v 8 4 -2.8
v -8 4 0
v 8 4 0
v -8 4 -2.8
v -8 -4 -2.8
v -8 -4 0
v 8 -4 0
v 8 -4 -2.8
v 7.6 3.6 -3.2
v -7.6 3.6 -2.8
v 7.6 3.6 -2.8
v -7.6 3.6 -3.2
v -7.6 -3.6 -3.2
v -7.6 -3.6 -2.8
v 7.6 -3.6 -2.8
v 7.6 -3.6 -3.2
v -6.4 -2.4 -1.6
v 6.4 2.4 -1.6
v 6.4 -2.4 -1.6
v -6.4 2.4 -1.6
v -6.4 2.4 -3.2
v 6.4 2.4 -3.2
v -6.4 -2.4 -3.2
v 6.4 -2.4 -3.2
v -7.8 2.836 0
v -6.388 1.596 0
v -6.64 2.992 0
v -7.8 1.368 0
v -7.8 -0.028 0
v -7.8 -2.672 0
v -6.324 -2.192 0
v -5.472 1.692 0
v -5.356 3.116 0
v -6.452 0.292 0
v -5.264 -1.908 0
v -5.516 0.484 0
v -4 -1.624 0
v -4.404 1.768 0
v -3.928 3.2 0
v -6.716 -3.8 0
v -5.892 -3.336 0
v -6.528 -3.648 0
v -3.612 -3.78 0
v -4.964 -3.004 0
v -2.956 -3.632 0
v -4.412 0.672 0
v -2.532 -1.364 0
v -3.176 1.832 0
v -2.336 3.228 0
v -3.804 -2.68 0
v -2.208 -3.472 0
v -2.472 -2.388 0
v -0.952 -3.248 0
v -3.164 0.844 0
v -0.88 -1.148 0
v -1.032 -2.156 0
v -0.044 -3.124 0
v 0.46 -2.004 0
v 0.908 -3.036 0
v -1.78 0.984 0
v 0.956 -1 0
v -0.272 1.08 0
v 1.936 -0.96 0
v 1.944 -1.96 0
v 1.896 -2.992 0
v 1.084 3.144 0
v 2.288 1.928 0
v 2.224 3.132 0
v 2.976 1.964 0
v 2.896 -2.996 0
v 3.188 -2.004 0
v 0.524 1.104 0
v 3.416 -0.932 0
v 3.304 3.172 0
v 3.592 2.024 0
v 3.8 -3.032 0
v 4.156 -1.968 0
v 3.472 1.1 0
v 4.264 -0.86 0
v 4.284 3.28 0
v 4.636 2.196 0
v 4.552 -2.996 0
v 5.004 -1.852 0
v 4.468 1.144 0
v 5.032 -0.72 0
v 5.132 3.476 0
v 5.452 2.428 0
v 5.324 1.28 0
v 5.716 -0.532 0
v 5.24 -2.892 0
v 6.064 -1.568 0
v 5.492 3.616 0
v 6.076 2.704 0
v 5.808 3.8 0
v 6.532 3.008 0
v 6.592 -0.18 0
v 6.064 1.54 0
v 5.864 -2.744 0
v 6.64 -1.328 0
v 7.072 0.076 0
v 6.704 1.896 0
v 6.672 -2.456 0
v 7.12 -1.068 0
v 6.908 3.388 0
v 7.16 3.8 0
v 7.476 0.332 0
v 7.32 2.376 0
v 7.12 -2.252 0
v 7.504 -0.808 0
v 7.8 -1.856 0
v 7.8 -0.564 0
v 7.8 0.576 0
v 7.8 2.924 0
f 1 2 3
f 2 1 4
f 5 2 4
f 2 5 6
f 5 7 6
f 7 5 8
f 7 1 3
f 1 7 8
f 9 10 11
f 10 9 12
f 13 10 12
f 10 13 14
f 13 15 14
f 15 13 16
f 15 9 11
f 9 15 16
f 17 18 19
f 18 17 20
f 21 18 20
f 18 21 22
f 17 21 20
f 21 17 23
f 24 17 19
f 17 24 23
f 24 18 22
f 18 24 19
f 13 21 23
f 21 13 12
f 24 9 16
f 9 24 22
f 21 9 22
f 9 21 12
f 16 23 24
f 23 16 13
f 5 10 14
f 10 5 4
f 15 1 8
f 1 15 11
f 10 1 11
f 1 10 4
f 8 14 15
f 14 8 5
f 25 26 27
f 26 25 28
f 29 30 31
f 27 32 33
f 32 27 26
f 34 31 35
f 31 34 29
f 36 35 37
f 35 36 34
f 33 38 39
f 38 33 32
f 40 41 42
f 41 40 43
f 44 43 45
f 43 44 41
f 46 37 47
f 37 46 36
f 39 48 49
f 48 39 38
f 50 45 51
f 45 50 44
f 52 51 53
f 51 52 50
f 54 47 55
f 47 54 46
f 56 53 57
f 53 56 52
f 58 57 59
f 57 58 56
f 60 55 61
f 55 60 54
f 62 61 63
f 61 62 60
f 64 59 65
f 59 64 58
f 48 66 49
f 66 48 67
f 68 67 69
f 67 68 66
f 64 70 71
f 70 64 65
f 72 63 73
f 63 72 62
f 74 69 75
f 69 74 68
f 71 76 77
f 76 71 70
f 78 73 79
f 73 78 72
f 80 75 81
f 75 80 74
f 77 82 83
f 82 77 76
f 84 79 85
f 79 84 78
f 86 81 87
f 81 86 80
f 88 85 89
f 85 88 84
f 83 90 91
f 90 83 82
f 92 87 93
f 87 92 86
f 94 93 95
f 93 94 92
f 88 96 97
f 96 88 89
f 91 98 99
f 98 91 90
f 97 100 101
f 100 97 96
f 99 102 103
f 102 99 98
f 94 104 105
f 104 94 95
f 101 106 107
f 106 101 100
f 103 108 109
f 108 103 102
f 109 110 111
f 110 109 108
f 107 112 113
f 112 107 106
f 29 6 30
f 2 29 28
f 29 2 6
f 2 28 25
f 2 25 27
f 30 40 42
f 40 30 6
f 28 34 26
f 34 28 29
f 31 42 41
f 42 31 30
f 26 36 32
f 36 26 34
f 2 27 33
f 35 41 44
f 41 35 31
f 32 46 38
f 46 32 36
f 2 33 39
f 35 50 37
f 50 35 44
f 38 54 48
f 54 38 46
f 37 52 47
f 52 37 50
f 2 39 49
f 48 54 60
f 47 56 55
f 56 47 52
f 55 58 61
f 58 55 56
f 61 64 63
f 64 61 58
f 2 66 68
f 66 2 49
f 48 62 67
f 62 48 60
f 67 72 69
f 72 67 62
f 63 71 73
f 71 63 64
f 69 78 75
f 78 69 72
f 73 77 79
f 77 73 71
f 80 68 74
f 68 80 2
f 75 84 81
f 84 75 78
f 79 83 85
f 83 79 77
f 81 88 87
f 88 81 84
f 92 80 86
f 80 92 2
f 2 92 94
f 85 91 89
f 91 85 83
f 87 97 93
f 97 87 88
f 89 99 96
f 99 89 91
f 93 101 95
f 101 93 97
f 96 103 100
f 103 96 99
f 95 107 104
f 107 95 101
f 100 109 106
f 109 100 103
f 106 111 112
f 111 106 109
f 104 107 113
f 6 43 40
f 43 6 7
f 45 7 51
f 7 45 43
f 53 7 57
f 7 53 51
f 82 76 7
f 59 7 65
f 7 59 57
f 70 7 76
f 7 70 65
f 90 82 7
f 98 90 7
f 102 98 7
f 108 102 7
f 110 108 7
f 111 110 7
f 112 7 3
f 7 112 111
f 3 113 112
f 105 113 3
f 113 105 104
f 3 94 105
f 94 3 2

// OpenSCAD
// file: ../p/box5.scad
use <../lib.scad>
function ldraw_lib__box5() = [
// 0 Box with 5 Faces and All Edges
// 0 Name: box5.dat
// 0 Author: James Jessiman
// 0 !LDRAW_ORG Primitive UPDATE 2012-01
// 0 !LICENSE Licensed under CC BY 4.0 : see CAreadme.txt
// 
// 0 BFC CERTIFY CCW
  [0,"BFC","CERTIFY"],
  [0,"BFC","CCW"],
// 
// 0 !HISTORY 2002-04-03 [sbliss] Modified for BFC compliance
// 0 !HISTORY 2002-04-25 [PTadmin] Official Update 2002-02
// 0 !HISTORY 2007-06-24 [PTadmin] Header formatted for Contributor Agreement
// 0 !HISTORY 2008-07-01 [PTadmin] Official Update 2008-01
// 0 !HISTORY 2012-02-16 [Philo] Changed to CCW
// 0 !HISTORY 2012-03-30 [PTadmin] Official Update 2012-01
// 
// 
// 2 24 1 1 1 -1 1 1
  [2,24,1,1,1,-1,1,1],
// 2 24 -1 1 1 -1 1 -1
  [2,24,-1,1,1,-1,1,-1],
// 2 24 -1 1 -1 1 1 -1
  [2,24,-1,1,-1,1,1,-1],
// 2 24 1 1 -1 1 1 1
  [2,24,1,1,-1,1,1,1],
// 2 24 1 0 1 -1 0 1
  [2,24,1,0,1,-1,0,1],
// 2 24 -1 0 1 -1 0 -1
  [2,24,-1,0,1,-1,0,-1],
// 2 24 -1 0 -1 1 0 -1
  [2,24,-1,0,-1,1,0,-1],
// 2 24 1 0 -1 1 0 1
  [2,24,1,0,-1,1,0,1],
// 2 24 1 0 1 1 1 1
  [2,24,1,0,1,1,1,1],
// 2 24 -1 0 1 -1 1 1
  [2,24,-1,0,1,-1,1,1],
// 2 24 1 0 -1 1 1 -1
  [2,24,1,0,-1,1,1,-1],
// 2 24 -1 0 -1 -1 1 -1
  [2,24,-1,0,-1,-1,1,-1],
// 4 16 -1 1 1 1 1 1 1 1 -1 -1 1 -1
  [4,16,-1,1,1,1,1,1,1,1,-1,-1,1,-1],
// 4 16 -1 1 1 -1 0 1 1 0 1 1 1 1
  [4,16,-1,1,1,-1,0,1,1,0,1,1,1,1],
// 4 16 -1 1 -1 -1 0 -1 -1 0 1 -1 1 1
  [4,16,-1,1,-1,-1,0,-1,-1,0,1,-1,1,1],
// 4 16 1 1 -1 1 0 -1 -1 0 -1 -1 1 -1
  [4,16,1,1,-1,1,0,-1,-1,0,-1,-1,1,-1],
// 4 16 1 1 1 1 0 1 1 0 -1 1 1 -1
  [4,16,1,1,1,1,0,1,1,0,-1,1,1,-1],
];
module ldraw_lib__box5(step=0, col=false, unit=2/5, alt=false, line=0.2, solid=!$preview)
    makepoly(ldraw_lib__box5(), step=step, col=col, unit=unit, alt=alt, line=line, solid=solid);
ldraw_lib__box5(line=0.2);
// file: ../p/box4.scad
use <../lib.scad>
function ldraw_lib__box4() = [
// 0 Box with 4 Faces (2 Parallel Pairs) and All Edges
// 0 Name: box4.dat
// 0 Author: James Jessiman
// 0 !LDRAW_ORG Primitive UPDATE 2012-01
// 0 !LICENSE Licensed under CC BY 4.0 : see CAreadme.txt
// 
// 0 BFC CERTIFY CCW
  [0,"BFC","CERTIFY"],
  [0,"BFC","CCW"],
// 
// 0 !HISTORY 2002-04-03 [sbliss] Modified for BFC compliance
// 0 !HISTORY 2002-04-25 [PTadmin] Official Update 2002-02
// 0 !HISTORY 2007-06-24 [PTadmin] Header formatted for Contributor Agreement
// 0 !HISTORY 2008-07-01 [PTadmin] Official Update 2008-01
// 0 !HISTORY 2012-02-16 [Philo] Changed to CCW
// 0 !HISTORY 2012-03-30 [PTadmin] Official Update 2012-01
// 
// 
// 2 24 1 1 1 -1 1 1
  [2,24,1,1,1,-1,1,1],
// 2 24 -1 1 1 -1 1 -1
  [2,24,-1,1,1,-1,1,-1],
// 2 24 -1 1 -1 1 1 -1
  [2,24,-1,1,-1,1,1,-1],
// 2 24 1 1 -1 1 1 1
  [2,24,1,1,-1,1,1,1],
// 2 24 1 0 1 -1 0 1
  [2,24,1,0,1,-1,0,1],
// 2 24 -1 0 1 -1 0 -1
  [2,24,-1,0,1,-1,0,-1],
// 2 24 -1 0 -1 1 0 -1
  [2,24,-1,0,-1,1,0,-1],
// 2 24 1 0 -1 1 0 1
  [2,24,1,0,-1,1,0,1],
// 2 24 1 0 1 1 1 1
  [2,24,1,0,1,1,1,1],
// 2 24 -1 0 1 -1 1 1
  [2,24,-1,0,1,-1,1,1],
// 2 24 1 0 -1 1 1 -1
  [2,24,1,0,-1,1,1,-1],
// 2 24 -1 0 -1 -1 1 -1
  [2,24,-1,0,-1,-1,1,-1],
// 4 16 -1 1 1 -1 0 1 1 0 1 1 1 1
  [4,16,-1,1,1,-1,0,1,1,0,1,1,1,1],
// 4 16 -1 1 -1 -1 0 -1 -1 0 1 -1 1 1
  [4,16,-1,1,-1,-1,0,-1,-1,0,1,-1,1,1],
// 4 16 1 1 -1 1 0 -1 -1 0 -1 -1 1 -1
  [4,16,1,1,-1,1,0,-1,-1,0,-1,-1,1,-1],
// 4 16 1 1 1 1 0 1 1 0 -1 1 1 -1
  [4,16,1,1,1,1,0,1,1,0,-1,1,1,-1],
];
module ldraw_lib__box4(step=0, col=false, unit=2/5, alt=false, line=0.2, solid=!$preview)
    makepoly(ldraw_lib__box4(), step=step, col=col, unit=unit, alt=alt, line=line, solid=solid);
ldraw_lib__box4(line=0.2);
// file: s/3069bs01.scad
use <../../lib.scad>
use <../../p/box4.scad>
use <../../p/box5.scad>
function ldraw_lib__s__3069bs01() = [
// 0 ~Tile  1 x  2 with Groove without Top Face
// 0 Name: s\3069bs01.dat
// 0 Author: Santeri Piippo [arezey]
// 0 !LDRAW_ORG Subpart UPDATE 2010-02
// 0 !LICENSE Licensed under CC BY 4.0 : see CAreadme.txt
// 
// 0 BFC CERTIFY CCW
  [0,"BFC","CERTIFY"],
  [0,"BFC","CCW"],
// 
// 0 !HISTORY 2010-07-05 [PTadmin] Official Update 2010-02
// 
// 
// 1 16 0 0 0 20 0 0 0 7 0 0 0 10 box4.dat
  [1,16,0,0,0,20,0,0,0,7,0,0,0,10, ldraw_lib__box4()],
// 1 16 0 7 0 19 0 0 0 1 0 0 0 9 box4.dat
  [1,16,0,7,0,19,0,0,0,1,0,0,0,9, ldraw_lib__box4()],
// 0 BFC INVERTNEXT
  [0,"BFC","INVERTNEXT"],
// 1 16 0 8 0 16 0 0 0 -4 0 0 0 6 box5.dat
  [1,16,0,8,0,16,0,0,0,-4,0,0,0,6, ldraw_lib__box5()],
// 4 16 -19 8 9 -16 8 6 -16 8 -6 -19 8 -9
  [4,16,-19,8,9,-16,8,6,-16,8,-6,-19,8,-9],
// 4 16 19 8 -9 16 8 -6 16 8 6 19 8 9
  [4,16,19,8,-9,16,8,-6,16,8,6,19,8,9],
// 4 16 19 8 9 16 8 6 -16 8 6 -19 8 9
  [4,16,19,8,9,16,8,6,-16,8,6,-19,8,9],
// 4 16 -19 8 -9 -16 8 -6 16 8 -6 19 8 -9
  [4,16,-19,8,-9,-16,8,-6,16,8,-6,19,8,-9],
// 4 16 -20 7 10 -19 7 9 -19 7 -9 -20 7 -10
  [4,16,-20,7,10,-19,7,9,-19,7,-9,-20,7,-10],
// 4 16 20 7 -10 19 7 -9 19 7 9 20 7 10
  [4,16,20,7,-10,19,7,-9,19,7,9,20,7,10],
// 4 16 20 7 10 19 7 9 -19 7 9 -20 7 10
  [4,16,20,7,10,19,7,9,-19,7,9,-20,7,10],
// 4 16 -20 7 -10 -19 7 -9 19 7 -9 20 7 -10
  [4,16,-20,7,-10,-19,7,-9,19,7,-9,20,7,-10],
// 0 //
];
module ldraw_lib__s__3069bs01(step=0, col=false, unit=2/5, alt=false, line=0.2, solid=!$preview)
    makepoly(ldraw_lib__s__3069bs01(), step=step, col=col, unit=unit, alt=alt, line=line, solid=solid);
ldraw_lib__s__3069bs01(line=0.2);
// main file
use <../lib.scad>
use <s/3069bs01.scad>
function ldraw_lib__3069bpz2() = [
// 0 Tile  1 x  2 with  3 Dark Red Waves Pattern
// 0 Name: 3069bpz2.dat
// 0 Author: Damien Roux [Darats]
// 0 !LDRAW_ORG Part UPDATE 2017-01
// 0 !LICENSE Licensed under CC BY 4.0 : see CAreadme.txt
// 
// 0 BFC CERTIFY CCW
  [0,"BFC","CERTIFY"],
  [0,"BFC","CCW"],
// 
// 0 !KEYWORDS Brickheadz, BrickLink 3069bpb589, Captain Jack Sparrow, Set 41593
// 
// 0 !HISTORY 2017-12-30 [PTadmin] Official Update 2017-01
// 
// 
// 1 16 0 0 0 1 0 0 0 1 0 0 0 1 s\3069bs01.dat
  [1,16,0,0,0,1,0,0,0,1,0,0,0,1, ldraw_lib__s__3069bs01()],
// 4 320 -16.6 0 7.48 -19.5 0 7.09 -19.5 0 3.42 -15.97 0 3.99
  [4,320,-16.6,0,7.48,-19.5,0,7.09,-19.5,0,3.42,-15.97,0,3.99],
// 3 320 -19.5 0 -0.07 -19.5 0 -6.68 -15.81 0 -5.48
  [3,320,-19.5,0,-0.07,-19.5,0,-6.68,-15.81,0,-5.48],
// 4 320 -13.39 0 7.79 -16.6 0 7.48 -15.97 0 3.99 -13.68 0 4.23
  [4,320,-13.39,0,7.79,-16.6,0,7.48,-15.97,0,3.99,-13.68,0,4.23],
// 4 320 -13.16 0 -4.77 -16.13 0 0.73 -19.5 0 -0.07 -15.81 0 -5.48
  [4,320,-13.16,0,-4.77,-16.13,0,0.73,-19.5,0,-0.07,-15.81,0,-5.48],
// 4 320 -10 0 -4.06 -13.79 0 1.21 -16.13 0 0.73 -13.16 0 -4.77
  [4,320,-10,0,-4.06,-13.79,0,1.21,-16.13,0,0.73,-13.16,0,-4.77],
// 4 320 -9.82 0 8 -13.39 0 7.79 -13.68 0 4.23 -11.01 0 4.42
  [4,320,-9.82,0,8,-13.39,0,7.79,-13.68,0,4.23,-11.01,0,4.42],
// 4 320 -9.03 0 -9.45 -14.73 0 -8.34 -16.32 0 -9.12 -16.79 0 -9.5
  [4,320,-9.03,0,-9.45,-14.73,0,-8.34,-16.32,0,-9.12,-16.79,0,-9.5],
// 4 320 -7.39 0 -9.08 -12.41 0 -7.51 -14.73 0 -8.34 -9.03 0 -9.45
  [4,320,-7.39,0,-9.08,-12.41,0,-7.51,-14.73,0,-8.34,-9.03,0,-9.45],
// 4 320 -6.33 0 -3.41 -11.03 0 1.68 -13.79 0 1.21 -10 0 -4.06
  [4,320,-6.33,0,-3.41,-11.03,0,1.68,-13.79,0,1.21,-10,0,-4.06],
// 4 320 -5.84 0 8.07 -9.82 0 8 -11.01 0 4.42 -7.94 0 4.58
  [4,320,-5.84,0,8.07,-9.82,0,8,-11.01,0,4.42,-7.94,0,4.58],
// 4 320 -5.52 0 -8.68 -9.51 0 -6.7 -12.41 0 -7.51 -7.39 0 -9.08
  [4,320,-5.52,0,-8.68,-9.51,0,-6.7,-12.41,0,-7.51,-7.39,0,-9.08],
// 4 320 -2.38 0 -8.12 -6.18 0 -5.97 -9.51 0 -6.7 -5.52 0 -8.68
  [4,320,-2.38,0,-8.12,-6.18,0,-5.97,-9.51,0,-6.7,-5.52,0,-8.68],
// 4 320 -2.2 0 -2.87 -7.91 0 2.11 -11.03 0 1.68 -6.33 0 -3.41
  [4,320,-2.2,0,-2.87,-7.91,0,2.11,-11.03,0,1.68,-6.33,0,-3.41],
// 4 320 -0.11 0 -7.81 -2.58 0 -5.39 -6.18 0 -5.97 -2.38 0 -8.12
  [4,320,-0.11,0,-7.81,-2.58,0,-5.39,-6.18,0,-5.97,-2.38,0,-8.12],
// 4 320 2.27 0 -7.59 1.15 0 -5.01 -2.58 0 -5.39 -0.11 0 -7.81
  [4,320,2.27,0,-7.59,1.15,0,-5.01,-2.58,0,-5.39,-0.11,0,-7.81],
// 4 320 2.39 0 -2.5 -4.45 0 2.46 -7.91 0 2.11 -2.2 0 -2.87
  [4,320,2.39,0,-2.5,-4.45,0,2.46,-7.91,0,2.11,-2.2,0,-2.87],
// 4 320 4.84 0 -2.4 -0.68 0 2.7 -4.45 0 2.46 2.39 0 -2.5
  [4,320,4.84,0,-2.4,-0.68,0,2.7,-4.45,0,2.46,2.39,0,-2.5],
// 4 320 4.74 0 -7.48 4.86 0 -4.9 1.15 0 -5.01 2.27 0 -7.59
  [4,320,4.74,0,-7.48,4.86,0,-4.9,1.15,0,-5.01,2.27,0,-7.59],
// 4 320 2.71 0 7.86 -5.84 0 8.07 -7.94 0 4.58 5.72 0 4.82
  [4,320,2.71,0,7.86,-5.84,0,8.07,-7.94,0,4.58,5.72,0,4.82],
// 4 320 5.56 0 7.83 2.71 0 7.86 5.72 0 4.82 7.44 0 4.91
  [4,320,5.56,0,7.83,2.71,0,7.86,5.72,0,4.82,7.44,0,4.91],
// 4 320 7.24 0 -7.49 7.97 0 -5.01 4.86 0 -4.9 4.74 0 -7.48
  [4,320,7.24,0,-7.49,7.97,0,-5.01,4.86,0,-4.9,4.74,0,-7.48],
// 4 320 8.54 0 -2.33 1.31 0 2.76 -0.68 0 2.7 4.84 0 -2.4
  [4,320,8.54,0,-2.33,1.31,0,2.76,-0.68,0,2.7,4.84,0,-2.4],
// 4 320 8.26 0 7.93 5.56 0 7.83 7.44 0 4.91 8.98 0 5.06
  [4,320,8.26,0,7.93,5.56,0,7.83,7.44,0,4.91,8.98,0,5.06],
// 4 320 9.5 0 -7.58 10.39 0 -4.92 7.97 0 -5.01 7.24 0 -7.49
  [4,320,9.5,0,-7.58,10.39,0,-4.92,7.97,0,-5.01,7.24,0,-7.49],
// 4 320 10.66 0 -2.15 8.68 0 2.75 1.31 0 2.76 8.54 0 -2.33
  [4,320,10.66,0,-2.15,8.68,0,2.75,1.31,0,2.76,8.54,0,-2.33],
// 4 320 10.71 0 8.2 8.26 0 7.93 8.98 0 5.06 11.59 0 5.49
  [4,320,10.71,0,8.2,8.26,0,7.93,8.98,0,5.06,11.59,0,5.49],
// 4 320 11.38 0 -7.49 12.51 0 -4.63 10.39 0 -4.92 9.5 0 -7.58
  [4,320,11.38,0,-7.49,12.51,0,-4.63,10.39,0,-4.92,9.5,0,-7.58],
// 4 320 12.58 0 -1.8 11.17 0 2.86 8.68 0 2.75 10.66 0 -2.15
  [4,320,12.58,0,-1.8,11.17,0,2.86,8.68,0,2.75,10.66,0,-2.15],
// 4 320 12.83 0 8.69 10.71 0 8.2 11.59 0 5.49 13.63 0 6.07
  [4,320,12.83,0,8.69,10.71,0,8.2,11.59,0,5.49,13.63,0,6.07],
// 4 320 14.29 0 -1.33 13.31 0 3.2 11.17 0 2.86 12.58 0 -1.8
  [4,320,14.29,0,-1.33,13.31,0,3.2,11.17,0,2.86,12.58,0,-1.8],
// 4 320 13.1 0 -7.23 15.16 0 -3.92 12.51 0 -4.63 11.38 0 -7.49
  [4,320,13.1,0,-7.23,15.16,0,-3.92,12.51,0,-4.63,11.38,0,-7.49],
// 4 320 13.73 0 9.04 12.83 0 8.69 13.63 0 6.07 15.19 0 6.76
  [4,320,13.73,0,9.04,12.83,0,8.69,13.63,0,6.07,15.19,0,6.76],
// 4 320 14.52 0 9.5 13.73 0 9.04 15.19 0 6.76 16.33 0 7.52
  [4,320,14.52,0,9.5,13.73,0,9.04,15.19,0,6.76,16.33,0,7.52],
// 4 320 16.48 0 -0.45 15.16 0 3.85 13.31 0 3.2 14.29 0 -1.33
  [4,320,16.48,0,-0.45,15.16,0,3.85,13.31,0,3.2,14.29,0,-1.33],
// 4 320 14.66 0 -6.86 16.6 0 -3.32 15.16 0 -3.92 13.1 0 -7.23
  [4,320,14.66,0,-6.86,16.6,0,-3.32,15.16,0,-3.92,13.1,0,-7.23],
// 4 320 17.68 0 0.19 16.76 0 4.74 15.16 0 3.85 16.48 0 -0.45
  [4,320,17.68,0,0.19,16.76,0,4.74,15.16,0,3.85,16.48,0,-0.45],
// 4 320 16.68 0 -6.14 17.8 0 -2.67 16.6 0 -3.32 14.66 0 -6.86
  [4,320,16.68,0,-6.14,17.8,0,-2.67,16.6,0,-3.32,14.66,0,-6.86],
// 4 320 14.52 0 9.5 16.33 0 7.52 17.27 0 8.47 17.9 0 9.5
  [4,320,14.52,0,9.5,16.33,0,7.52,17.27,0,8.47,17.9,0,9.5],
// 4 320 18.69 0 0.83 18.3 0 5.94 16.76 0 4.74 17.68 0 0.19
  [4,320,18.69,0,0.83,18.3,0,5.94,16.76,0,4.74,17.68,0,0.19],
// 4 320 17.8 0 -5.63 18.76 0 -2.02 17.8 0 -2.67 16.68 0 -6.14
  [4,320,17.8,0,-5.63,18.76,0,-2.02,17.8,0,-2.67,16.68,0,-6.14],
// 4 320 19.5 0 -4.64 19.5 0 -1.41 18.76 0 -2.02 17.8 0 -5.63
  [4,320,19.5,0,-4.64,19.5,0,-1.41,18.76,0,-2.02,17.8,0,-5.63],
// 4 320 19.5 0 1.44 19.5 0 7.31 18.3 0 5.94 18.69 0 0.83
  [4,320,19.5,0,1.44,19.5,0,7.31,18.3,0,5.94,18.69,0,0.83],
// 3 16 -19.5 0 -0.07 -20 0 -10 -19.5 0 -6.68
  [3,16,-19.5,0,-0.07,-20,0,-10,-19.5,0,-6.68],
// 4 16 -19.5 0 -0.07 -19.5 0 3.42 -20 0 10 -20 0 -10
  [4,16,-19.5,0,-0.07,-19.5,0,3.42,-20,0,10,-20,0,-10],
// 3 16 -20 0 10 -19.5 0 3.42 -19.5 0 7.09
  [3,16,-20,0,10,-19.5,0,3.42,-19.5,0,7.09],
// 3 16 -20 0 10 -19.5 0 7.09 -16.6 0 7.48
  [3,16,-20,0,10,-19.5,0,7.09,-16.6,0,7.48],
// 4 16 -19.5 0 -6.68 -20 0 -10 -16.79 0 -9.5 -16.32 0 -9.12
  [4,16,-19.5,0,-6.68,-20,0,-10,-16.79,0,-9.5,-16.32,0,-9.12],
// 4 16 -15.97 0 3.99 -19.5 0 3.42 -19.5 0 -0.07 -16.13 0 0.73
  [4,16,-15.97,0,3.99,-19.5,0,3.42,-19.5,0,-0.07,-16.13,0,0.73],
// 4 16 -15.81 0 -5.48 -19.5 0 -6.68 -16.32 0 -9.12 -14.73 0 -8.34
  [4,16,-15.81,0,-5.48,-19.5,0,-6.68,-16.32,0,-9.12,-14.73,0,-8.34],
// 4 16 -13.68 0 4.23 -15.97 0 3.99 -16.13 0 0.73 -13.79 0 1.21
  [4,16,-13.68,0,4.23,-15.97,0,3.99,-16.13,0,0.73,-13.79,0,1.21],
// 3 16 -20 0 10 -16.6 0 7.48 -13.39 0 7.79
  [3,16,-20,0,10,-16.6,0,7.48,-13.39,0,7.79],
// 4 16 -13.16 0 -4.77 -15.81 0 -5.48 -14.73 0 -8.34 -12.41 0 -7.51
  [4,16,-13.16,0,-4.77,-15.81,0,-5.48,-14.73,0,-8.34,-12.41,0,-7.51],
// 4 16 -11.01 0 4.42 -13.68 0 4.23 -13.79 0 1.21 -11.03 0 1.68
  [4,16,-11.01,0,4.42,-13.68,0,4.23,-13.79,0,1.21,-11.03,0,1.68],
// 3 16 -20 0 10 -13.39 0 7.79 -9.82 0 8
  [3,16,-20,0,10,-13.39,0,7.79,-9.82,0,8],
// 4 16 -10 0 -4.06 -13.16 0 -4.77 -12.41 0 -7.51 -9.51 0 -6.7
  [4,16,-10,0,-4.06,-13.16,0,-4.77,-12.41,0,-7.51,-9.51,0,-6.7],
// 4 16 -7.94 0 4.58 -11.01 0 4.42 -11.03 0 1.68 -7.91 0 2.11
  [4,16,-7.94,0,4.58,-11.01,0,4.42,-11.03,0,1.68,-7.91,0,2.11],
// 4 16 -6.33 0 -3.41 -10 0 -4.06 -9.51 0 -6.7 -6.18 0 -5.97
  [4,16,-6.33,0,-3.41,-10,0,-4.06,-9.51,0,-6.7,-6.18,0,-5.97],
// 3 16 -20 0 10 -9.82 0 8 -5.84 0 8.07
  [3,16,-20,0,10,-9.82,0,8,-5.84,0,8.07],
// 3 16 -7.94 0 4.58 -7.91 0 2.11 -4.45 0 2.46
  [3,16,-7.94,0,4.58,-7.91,0,2.11,-4.45,0,2.46],
// 4 16 -2.2 0 -2.87 -6.33 0 -3.41 -6.18 0 -5.97 -2.58 0 -5.39
  [4,16,-2.2,0,-2.87,-6.33,0,-3.41,-6.18,0,-5.97,-2.58,0,-5.39],
// 4 16 2.39 0 -2.5 -2.2 0 -2.87 -2.58 0 -5.39 1.15 0 -5.01
  [4,16,2.39,0,-2.5,-2.2,0,-2.87,-2.58,0,-5.39,1.15,0,-5.01],
// 4 16 4.84 0 -2.4 2.39 0 -2.5 1.15 0 -5.01 4.86 0 -4.9
  [4,16,4.84,0,-2.4,2.39,0,-2.5,1.15,0,-5.01,4.86,0,-4.9],
// 4 16 -20 0 10 -5.84 0 8.07 2.71 0 7.86 5.56 0 7.83
  [4,16,-20,0,10,-5.84,0,8.07,2.71,0,7.86,5.56,0,7.83],
// 4 16 -7.94 0 4.58 -4.45 0 2.46 -0.68 0 2.7 5.72 0 4.82
  [4,16,-7.94,0,4.58,-4.45,0,2.46,-0.68,0,2.7,5.72,0,4.82],
// 4 16 5.72 0 4.82 -0.68 0 2.7 1.31 0 2.76 7.44 0 4.91
  [4,16,5.72,0,4.82,-0.68,0,2.7,1.31,0,2.76,7.44,0,4.91],
// 4 16 8.54 0 -2.33 4.84 0 -2.4 4.86 0 -4.9 7.97 0 -5.01
  [4,16,8.54,0,-2.33,4.84,0,-2.4,4.86,0,-4.9,7.97,0,-5.01],
// 4 16 7.44 0 4.91 1.31 0 2.76 8.68 0 2.75 8.98 0 5.06
  [4,16,7.44,0,4.91,1.31,0,2.76,8.68,0,2.75,8.98,0,5.06],
// 4 16 10.66 0 -2.15 8.54 0 -2.33 7.97 0 -5.01 10.39 0 -4.92
  [4,16,10.66,0,-2.15,8.54,0,-2.33,7.97,0,-5.01,10.39,0,-4.92],
// 4 16 -20 0 10 5.56 0 7.83 8.26 0 7.93 10.71 0 8.2
  [4,16,-20,0,10,5.56,0,7.83,8.26,0,7.93,10.71,0,8.2],
// 4 16 8.98 0 5.06 8.68 0 2.75 11.17 0 2.86 11.59 0 5.49
  [4,16,8.98,0,5.06,8.68,0,2.75,11.17,0,2.86,11.59,0,5.49],
// 4 16 12.58 0 -1.8 10.66 0 -2.15 10.39 0 -4.92 12.51 0 -4.63
  [4,16,12.58,0,-1.8,10.66,0,-2.15,10.39,0,-4.92,12.51,0,-4.63],
// 4 16 11.59 0 5.49 11.17 0 2.86 13.31 0 3.2 13.63 0 6.07
  [4,16,11.59,0,5.49,11.17,0,2.86,13.31,0,3.2,13.63,0,6.07],
// 4 16 -20 0 10 10.71 0 8.2 12.83 0 8.69 13.73 0 9.04
  [4,16,-20,0,10,10.71,0,8.2,12.83,0,8.69,13.73,0,9.04],
// 3 16 -20 0 10 13.73 0 9.04 14.52 0 9.5
  [3,16,-20,0,10,13.73,0,9.04,14.52,0,9.5],
// 4 16 14.29 0 -1.33 12.58 0 -1.8 12.51 0 -4.63 15.16 0 -3.92
  [4,16,14.29,0,-1.33,12.58,0,-1.8,12.51,0,-4.63,15.16,0,-3.92],
// 4 16 13.63 0 6.07 13.31 0 3.2 15.16 0 3.85 15.19 0 6.76
  [4,16,13.63,0,6.07,13.31,0,3.2,15.16,0,3.85,15.19,0,6.76],
// 4 16 16.48 0 -0.45 14.29 0 -1.33 15.16 0 -3.92 16.6 0 -3.32
  [4,16,16.48,0,-0.45,14.29,0,-1.33,15.16,0,-3.92,16.6,0,-3.32],
// 4 16 15.19 0 6.76 15.16 0 3.85 16.76 0 4.74 16.33 0 7.52
  [4,16,15.19,0,6.76,15.16,0,3.85,16.76,0,4.74,16.33,0,7.52],
// 4 16 17.68 0 0.19 16.48 0 -0.45 16.6 0 -3.32 17.8 0 -2.67
  [4,16,17.68,0,0.19,16.48,0,-0.45,16.6,0,-3.32,17.8,0,-2.67],
// 4 16 16.33 0 7.52 16.76 0 4.74 18.3 0 5.94 17.27 0 8.47
  [4,16,16.33,0,7.52,16.76,0,4.74,18.3,0,5.94,17.27,0,8.47],
// 4 16 18.69 0 0.83 17.68 0 0.19 17.8 0 -2.67 18.76 0 -2.02
  [4,16,18.69,0,0.83,17.68,0,0.19,17.8,0,-2.67,18.76,0,-2.02],
// 4 16 19.5 0 1.44 18.69 0 0.83 18.76 0 -2.02 19.5 0 -1.41
  [4,16,19.5,0,1.44,18.69,0,0.83,18.76,0,-2.02,19.5,0,-1.41],
// 3 16 17.27 0 8.47 18.3 0 5.94 19.5 0 7.31
  [3,16,17.27,0,8.47,18.3,0,5.94,19.5,0,7.31],
// 4 16 -9.03 0 -9.45 -16.79 0 -9.5 -20 0 -10 20 0 -10
  [4,16,-9.03,0,-9.45,-16.79,0,-9.5,-20,0,-10,20,0,-10],
// 4 16 20 0 -10 -5.52 0 -8.68 -7.39 0 -9.08 -9.03 0 -9.45
  [4,16,20,0,-10,-5.52,0,-8.68,-7.39,0,-9.08,-9.03,0,-9.45],
// 4 16 20 0 -10 -0.11 0 -7.81 -2.38 0 -8.12 -5.52 0 -8.68
  [4,16,20,0,-10,-0.11,0,-7.81,-2.38,0,-8.12,-5.52,0,-8.68],
// 3 16 11.38 0 -7.49 9.5 0 -7.58 20 0 -10
  [3,16,11.38,0,-7.49,9.5,0,-7.58,20,0,-10],
// 4 16 20 0 -10 4.74 0 -7.48 2.27 0 -7.59 -0.11 0 -7.81
  [4,16,20,0,-10,4.74,0,-7.48,2.27,0,-7.59,-0.11,0,-7.81],
// 4 16 20 0 -10 9.5 0 -7.58 7.24 0 -7.49 4.74 0 -7.48
  [4,16,20,0,-10,9.5,0,-7.58,7.24,0,-7.49,4.74,0,-7.48],
// 3 16 13.1 0 -7.23 11.38 0 -7.49 20 0 -10
  [3,16,13.1,0,-7.23,11.38,0,-7.49,20,0,-10],
// 3 16 14.66 0 -6.86 13.1 0 -7.23 20 0 -10
  [3,16,14.66,0,-6.86,13.1,0,-7.23,20,0,-10],
// 3 16 16.68 0 -6.14 14.66 0 -6.86 20 0 -10
  [3,16,16.68,0,-6.14,14.66,0,-6.86,20,0,-10],
// 3 16 17.8 0 -5.63 16.68 0 -6.14 20 0 -10
  [3,16,17.8,0,-5.63,16.68,0,-6.14,20,0,-10],
// 3 16 19.5 0 -4.64 17.8 0 -5.63 20 0 -10
  [3,16,19.5,0,-4.64,17.8,0,-5.63,20,0,-10],
// 3 16 19.5 0 -1.41 19.5 0 -4.64 20 0 -10
  [3,16,19.5,0,-1.41,19.5,0,-4.64,20,0,-10],
// 4 16 20 0 10 19.5 0 1.44 19.5 0 -1.41 20 0 -10
  [4,16,20,0,10,19.5,0,1.44,19.5,0,-1.41,20,0,-10],
// 3 16 20 0 10 19.5 0 7.31 19.5 0 1.44
  [3,16,20,0,10,19.5,0,7.31,19.5,0,1.44],
// 4 16 19.5 0 7.31 20 0 10 17.9 0 9.5 17.27 0 8.47
  [4,16,19.5,0,7.31,20,0,10,17.9,0,9.5,17.27,0,8.47],
// 4 16 20 0 10 -20 0 10 14.52 0 9.5 17.9 0 9.5
  [4,16,20,0,10,-20,0,10,14.52,0,9.5,17.9,0,9.5],
];
module ldraw_lib__3069bpz2(step=0, col=false, unit=2/5, alt=false, line=0.2, solid=!$preview)
    makepoly(ldraw_lib__3069bpz2(), step=step, col=col, unit=unit, alt=alt, line=line, solid=solid);
ldraw_lib__3069bpz2(line=0.2);
